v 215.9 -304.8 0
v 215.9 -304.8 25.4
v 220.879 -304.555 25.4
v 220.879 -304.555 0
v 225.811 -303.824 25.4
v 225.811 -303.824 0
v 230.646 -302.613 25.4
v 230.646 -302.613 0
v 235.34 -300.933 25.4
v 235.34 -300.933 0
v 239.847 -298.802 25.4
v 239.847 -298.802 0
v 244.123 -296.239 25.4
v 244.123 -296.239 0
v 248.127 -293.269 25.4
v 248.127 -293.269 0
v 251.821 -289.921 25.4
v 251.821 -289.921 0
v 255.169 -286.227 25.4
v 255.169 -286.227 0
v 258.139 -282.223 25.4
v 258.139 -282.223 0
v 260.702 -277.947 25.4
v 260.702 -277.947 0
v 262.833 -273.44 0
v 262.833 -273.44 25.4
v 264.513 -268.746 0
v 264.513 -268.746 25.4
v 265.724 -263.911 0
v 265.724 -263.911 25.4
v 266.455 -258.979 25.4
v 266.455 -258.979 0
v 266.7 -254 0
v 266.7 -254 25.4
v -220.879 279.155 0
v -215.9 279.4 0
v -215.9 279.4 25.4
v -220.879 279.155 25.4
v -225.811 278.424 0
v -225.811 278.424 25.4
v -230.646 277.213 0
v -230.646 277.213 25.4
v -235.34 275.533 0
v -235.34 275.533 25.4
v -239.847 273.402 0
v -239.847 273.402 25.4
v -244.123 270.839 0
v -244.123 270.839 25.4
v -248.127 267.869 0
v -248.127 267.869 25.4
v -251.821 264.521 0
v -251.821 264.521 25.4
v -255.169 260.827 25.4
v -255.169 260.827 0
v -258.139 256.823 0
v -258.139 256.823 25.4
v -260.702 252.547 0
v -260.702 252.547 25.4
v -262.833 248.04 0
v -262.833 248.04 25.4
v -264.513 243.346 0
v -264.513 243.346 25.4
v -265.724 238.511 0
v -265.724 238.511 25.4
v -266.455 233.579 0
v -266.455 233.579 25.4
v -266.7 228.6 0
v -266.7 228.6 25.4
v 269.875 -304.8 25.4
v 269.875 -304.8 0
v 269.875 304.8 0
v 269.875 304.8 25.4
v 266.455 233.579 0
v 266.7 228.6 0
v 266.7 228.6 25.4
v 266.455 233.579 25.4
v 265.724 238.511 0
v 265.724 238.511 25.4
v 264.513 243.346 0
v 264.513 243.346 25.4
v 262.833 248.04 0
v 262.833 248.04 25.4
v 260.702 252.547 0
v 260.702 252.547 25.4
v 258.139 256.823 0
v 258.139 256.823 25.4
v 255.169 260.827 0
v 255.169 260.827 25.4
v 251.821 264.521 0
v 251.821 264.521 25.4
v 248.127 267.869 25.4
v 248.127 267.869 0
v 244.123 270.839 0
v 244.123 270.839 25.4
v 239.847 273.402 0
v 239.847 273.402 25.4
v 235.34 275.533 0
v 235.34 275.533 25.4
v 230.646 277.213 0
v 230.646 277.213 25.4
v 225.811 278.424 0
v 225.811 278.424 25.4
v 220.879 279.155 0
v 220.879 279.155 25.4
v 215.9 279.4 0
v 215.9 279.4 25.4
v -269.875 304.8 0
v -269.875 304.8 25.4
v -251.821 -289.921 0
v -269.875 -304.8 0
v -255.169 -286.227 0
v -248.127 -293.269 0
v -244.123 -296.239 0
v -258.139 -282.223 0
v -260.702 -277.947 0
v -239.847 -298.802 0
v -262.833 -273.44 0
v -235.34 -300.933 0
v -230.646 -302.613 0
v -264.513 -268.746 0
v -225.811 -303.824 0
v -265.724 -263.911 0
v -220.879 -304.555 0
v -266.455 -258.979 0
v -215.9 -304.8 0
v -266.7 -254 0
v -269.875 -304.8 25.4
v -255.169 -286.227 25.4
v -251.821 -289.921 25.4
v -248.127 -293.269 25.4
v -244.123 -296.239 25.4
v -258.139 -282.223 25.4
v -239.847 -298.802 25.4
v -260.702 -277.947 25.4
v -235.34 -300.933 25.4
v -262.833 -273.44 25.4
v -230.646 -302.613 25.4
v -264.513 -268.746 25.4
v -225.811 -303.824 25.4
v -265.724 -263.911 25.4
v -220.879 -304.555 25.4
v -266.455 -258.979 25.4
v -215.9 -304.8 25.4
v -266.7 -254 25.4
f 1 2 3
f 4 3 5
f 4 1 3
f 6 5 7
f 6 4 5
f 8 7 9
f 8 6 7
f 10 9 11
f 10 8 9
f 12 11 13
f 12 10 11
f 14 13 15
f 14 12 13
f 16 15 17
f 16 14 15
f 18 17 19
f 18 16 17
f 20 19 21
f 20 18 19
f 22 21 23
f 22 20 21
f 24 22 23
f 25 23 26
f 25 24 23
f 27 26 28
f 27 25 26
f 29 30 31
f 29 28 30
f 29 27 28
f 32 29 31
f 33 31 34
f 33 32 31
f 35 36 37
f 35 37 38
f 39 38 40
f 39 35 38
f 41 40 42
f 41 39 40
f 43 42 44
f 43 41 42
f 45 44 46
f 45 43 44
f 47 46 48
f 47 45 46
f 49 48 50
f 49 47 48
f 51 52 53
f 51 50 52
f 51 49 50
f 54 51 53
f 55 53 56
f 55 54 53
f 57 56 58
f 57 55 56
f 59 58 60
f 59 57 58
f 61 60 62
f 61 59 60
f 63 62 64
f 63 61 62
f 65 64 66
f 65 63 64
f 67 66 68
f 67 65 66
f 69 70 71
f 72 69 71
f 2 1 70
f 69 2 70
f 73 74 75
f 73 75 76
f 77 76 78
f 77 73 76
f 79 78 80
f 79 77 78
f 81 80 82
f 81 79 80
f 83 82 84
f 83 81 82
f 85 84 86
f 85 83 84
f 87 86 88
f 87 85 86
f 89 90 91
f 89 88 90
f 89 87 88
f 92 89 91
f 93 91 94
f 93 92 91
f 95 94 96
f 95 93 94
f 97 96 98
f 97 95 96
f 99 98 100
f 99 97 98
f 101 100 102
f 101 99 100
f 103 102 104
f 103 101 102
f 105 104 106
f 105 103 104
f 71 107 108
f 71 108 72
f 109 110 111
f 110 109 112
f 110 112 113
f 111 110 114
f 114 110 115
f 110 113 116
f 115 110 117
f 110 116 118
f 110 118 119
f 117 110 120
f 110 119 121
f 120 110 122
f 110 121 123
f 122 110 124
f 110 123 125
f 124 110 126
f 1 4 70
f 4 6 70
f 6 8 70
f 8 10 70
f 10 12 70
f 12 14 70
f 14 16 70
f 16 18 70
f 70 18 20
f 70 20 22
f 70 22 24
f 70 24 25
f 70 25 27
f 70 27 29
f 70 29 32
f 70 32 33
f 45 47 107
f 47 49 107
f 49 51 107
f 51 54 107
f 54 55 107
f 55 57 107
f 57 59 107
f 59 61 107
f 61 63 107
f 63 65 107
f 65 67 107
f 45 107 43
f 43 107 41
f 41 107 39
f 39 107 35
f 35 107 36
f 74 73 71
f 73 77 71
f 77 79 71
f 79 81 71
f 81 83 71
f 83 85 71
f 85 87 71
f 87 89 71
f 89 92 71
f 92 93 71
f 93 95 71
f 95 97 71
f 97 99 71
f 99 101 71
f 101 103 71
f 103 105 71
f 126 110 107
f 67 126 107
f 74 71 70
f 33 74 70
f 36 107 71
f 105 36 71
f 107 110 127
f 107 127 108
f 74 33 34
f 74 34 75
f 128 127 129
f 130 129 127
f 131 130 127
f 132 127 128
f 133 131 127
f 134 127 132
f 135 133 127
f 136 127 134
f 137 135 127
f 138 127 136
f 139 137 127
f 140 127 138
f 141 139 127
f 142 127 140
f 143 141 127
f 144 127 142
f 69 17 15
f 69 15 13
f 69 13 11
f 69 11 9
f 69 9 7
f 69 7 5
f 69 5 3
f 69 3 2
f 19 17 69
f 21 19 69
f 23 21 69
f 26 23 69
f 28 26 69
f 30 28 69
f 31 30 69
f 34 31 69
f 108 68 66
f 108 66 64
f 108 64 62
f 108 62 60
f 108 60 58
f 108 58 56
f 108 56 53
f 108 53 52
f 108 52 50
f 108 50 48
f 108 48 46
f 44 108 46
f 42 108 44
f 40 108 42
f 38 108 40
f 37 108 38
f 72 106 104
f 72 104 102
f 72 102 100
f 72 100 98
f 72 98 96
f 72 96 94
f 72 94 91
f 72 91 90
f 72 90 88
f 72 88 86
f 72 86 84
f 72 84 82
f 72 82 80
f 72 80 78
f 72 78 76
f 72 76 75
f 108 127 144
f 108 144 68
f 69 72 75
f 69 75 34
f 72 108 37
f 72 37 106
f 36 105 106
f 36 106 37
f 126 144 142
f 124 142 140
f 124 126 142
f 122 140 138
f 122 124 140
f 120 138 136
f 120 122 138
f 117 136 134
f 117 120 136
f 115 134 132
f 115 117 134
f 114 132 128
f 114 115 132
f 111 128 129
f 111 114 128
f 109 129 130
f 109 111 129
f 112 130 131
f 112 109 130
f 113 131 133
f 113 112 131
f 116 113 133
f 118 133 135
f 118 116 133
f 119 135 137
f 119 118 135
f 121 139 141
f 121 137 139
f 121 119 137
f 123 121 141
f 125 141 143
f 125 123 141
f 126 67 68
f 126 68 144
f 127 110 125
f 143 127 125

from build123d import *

# Parameters (mm, degrees)
SKETCH1_W           = 539.75
SKETCH1_H           = 609.6
BOSS_EXTRUDE1_DEPTH = 25.4
CUT_EXTRUDE1_DEPTH  = 26.4


with BuildPart() as part:
    # Sketch1 → Boss-Extrude1 (new body)
    with BuildSketch(Plane.XY):
        Rectangle(SKETCH1_W, SKETCH1_H)
    extrude(amount=BOSS_EXTRUDE1_DEPTH)

    # Sketch2 → Cut-Extrude1 (cut, through all)
    with BuildSketch(Plane(origin=(0, 0, 0), x_dir=(-1, 0, 0), z_dir=(0, 0, -1))):
        with BuildLine():
            Line((-266.7, -254), (-266.7, 228.6))
            ThreePointArc((-266.7, 228.6), (-251.821024484, 264.521024484), (-215.9, 279.4))
            Line((-215.9, 279.4), (215.9, 279.4))
            ThreePointArc((215.9, 279.4), (251.821024484, 264.521024484), (266.7, 228.6))
            Line((266.7, 228.6), (266.7, -254))
            ThreePointArc((266.7, -254), (251.821024484, -289.921024484), (215.9, -304.8))
            Line((215.9, -304.8), (-215.9, -304.8))
            ThreePointArc((-215.9, -304.8), (-251.821024484, -289.921024484), (-266.7, -254))
        make_face()
    extrude(amount=-CUT_EXTRUDE1_DEPTH, mode=Mode.SUBTRACT)


solid = part.part
